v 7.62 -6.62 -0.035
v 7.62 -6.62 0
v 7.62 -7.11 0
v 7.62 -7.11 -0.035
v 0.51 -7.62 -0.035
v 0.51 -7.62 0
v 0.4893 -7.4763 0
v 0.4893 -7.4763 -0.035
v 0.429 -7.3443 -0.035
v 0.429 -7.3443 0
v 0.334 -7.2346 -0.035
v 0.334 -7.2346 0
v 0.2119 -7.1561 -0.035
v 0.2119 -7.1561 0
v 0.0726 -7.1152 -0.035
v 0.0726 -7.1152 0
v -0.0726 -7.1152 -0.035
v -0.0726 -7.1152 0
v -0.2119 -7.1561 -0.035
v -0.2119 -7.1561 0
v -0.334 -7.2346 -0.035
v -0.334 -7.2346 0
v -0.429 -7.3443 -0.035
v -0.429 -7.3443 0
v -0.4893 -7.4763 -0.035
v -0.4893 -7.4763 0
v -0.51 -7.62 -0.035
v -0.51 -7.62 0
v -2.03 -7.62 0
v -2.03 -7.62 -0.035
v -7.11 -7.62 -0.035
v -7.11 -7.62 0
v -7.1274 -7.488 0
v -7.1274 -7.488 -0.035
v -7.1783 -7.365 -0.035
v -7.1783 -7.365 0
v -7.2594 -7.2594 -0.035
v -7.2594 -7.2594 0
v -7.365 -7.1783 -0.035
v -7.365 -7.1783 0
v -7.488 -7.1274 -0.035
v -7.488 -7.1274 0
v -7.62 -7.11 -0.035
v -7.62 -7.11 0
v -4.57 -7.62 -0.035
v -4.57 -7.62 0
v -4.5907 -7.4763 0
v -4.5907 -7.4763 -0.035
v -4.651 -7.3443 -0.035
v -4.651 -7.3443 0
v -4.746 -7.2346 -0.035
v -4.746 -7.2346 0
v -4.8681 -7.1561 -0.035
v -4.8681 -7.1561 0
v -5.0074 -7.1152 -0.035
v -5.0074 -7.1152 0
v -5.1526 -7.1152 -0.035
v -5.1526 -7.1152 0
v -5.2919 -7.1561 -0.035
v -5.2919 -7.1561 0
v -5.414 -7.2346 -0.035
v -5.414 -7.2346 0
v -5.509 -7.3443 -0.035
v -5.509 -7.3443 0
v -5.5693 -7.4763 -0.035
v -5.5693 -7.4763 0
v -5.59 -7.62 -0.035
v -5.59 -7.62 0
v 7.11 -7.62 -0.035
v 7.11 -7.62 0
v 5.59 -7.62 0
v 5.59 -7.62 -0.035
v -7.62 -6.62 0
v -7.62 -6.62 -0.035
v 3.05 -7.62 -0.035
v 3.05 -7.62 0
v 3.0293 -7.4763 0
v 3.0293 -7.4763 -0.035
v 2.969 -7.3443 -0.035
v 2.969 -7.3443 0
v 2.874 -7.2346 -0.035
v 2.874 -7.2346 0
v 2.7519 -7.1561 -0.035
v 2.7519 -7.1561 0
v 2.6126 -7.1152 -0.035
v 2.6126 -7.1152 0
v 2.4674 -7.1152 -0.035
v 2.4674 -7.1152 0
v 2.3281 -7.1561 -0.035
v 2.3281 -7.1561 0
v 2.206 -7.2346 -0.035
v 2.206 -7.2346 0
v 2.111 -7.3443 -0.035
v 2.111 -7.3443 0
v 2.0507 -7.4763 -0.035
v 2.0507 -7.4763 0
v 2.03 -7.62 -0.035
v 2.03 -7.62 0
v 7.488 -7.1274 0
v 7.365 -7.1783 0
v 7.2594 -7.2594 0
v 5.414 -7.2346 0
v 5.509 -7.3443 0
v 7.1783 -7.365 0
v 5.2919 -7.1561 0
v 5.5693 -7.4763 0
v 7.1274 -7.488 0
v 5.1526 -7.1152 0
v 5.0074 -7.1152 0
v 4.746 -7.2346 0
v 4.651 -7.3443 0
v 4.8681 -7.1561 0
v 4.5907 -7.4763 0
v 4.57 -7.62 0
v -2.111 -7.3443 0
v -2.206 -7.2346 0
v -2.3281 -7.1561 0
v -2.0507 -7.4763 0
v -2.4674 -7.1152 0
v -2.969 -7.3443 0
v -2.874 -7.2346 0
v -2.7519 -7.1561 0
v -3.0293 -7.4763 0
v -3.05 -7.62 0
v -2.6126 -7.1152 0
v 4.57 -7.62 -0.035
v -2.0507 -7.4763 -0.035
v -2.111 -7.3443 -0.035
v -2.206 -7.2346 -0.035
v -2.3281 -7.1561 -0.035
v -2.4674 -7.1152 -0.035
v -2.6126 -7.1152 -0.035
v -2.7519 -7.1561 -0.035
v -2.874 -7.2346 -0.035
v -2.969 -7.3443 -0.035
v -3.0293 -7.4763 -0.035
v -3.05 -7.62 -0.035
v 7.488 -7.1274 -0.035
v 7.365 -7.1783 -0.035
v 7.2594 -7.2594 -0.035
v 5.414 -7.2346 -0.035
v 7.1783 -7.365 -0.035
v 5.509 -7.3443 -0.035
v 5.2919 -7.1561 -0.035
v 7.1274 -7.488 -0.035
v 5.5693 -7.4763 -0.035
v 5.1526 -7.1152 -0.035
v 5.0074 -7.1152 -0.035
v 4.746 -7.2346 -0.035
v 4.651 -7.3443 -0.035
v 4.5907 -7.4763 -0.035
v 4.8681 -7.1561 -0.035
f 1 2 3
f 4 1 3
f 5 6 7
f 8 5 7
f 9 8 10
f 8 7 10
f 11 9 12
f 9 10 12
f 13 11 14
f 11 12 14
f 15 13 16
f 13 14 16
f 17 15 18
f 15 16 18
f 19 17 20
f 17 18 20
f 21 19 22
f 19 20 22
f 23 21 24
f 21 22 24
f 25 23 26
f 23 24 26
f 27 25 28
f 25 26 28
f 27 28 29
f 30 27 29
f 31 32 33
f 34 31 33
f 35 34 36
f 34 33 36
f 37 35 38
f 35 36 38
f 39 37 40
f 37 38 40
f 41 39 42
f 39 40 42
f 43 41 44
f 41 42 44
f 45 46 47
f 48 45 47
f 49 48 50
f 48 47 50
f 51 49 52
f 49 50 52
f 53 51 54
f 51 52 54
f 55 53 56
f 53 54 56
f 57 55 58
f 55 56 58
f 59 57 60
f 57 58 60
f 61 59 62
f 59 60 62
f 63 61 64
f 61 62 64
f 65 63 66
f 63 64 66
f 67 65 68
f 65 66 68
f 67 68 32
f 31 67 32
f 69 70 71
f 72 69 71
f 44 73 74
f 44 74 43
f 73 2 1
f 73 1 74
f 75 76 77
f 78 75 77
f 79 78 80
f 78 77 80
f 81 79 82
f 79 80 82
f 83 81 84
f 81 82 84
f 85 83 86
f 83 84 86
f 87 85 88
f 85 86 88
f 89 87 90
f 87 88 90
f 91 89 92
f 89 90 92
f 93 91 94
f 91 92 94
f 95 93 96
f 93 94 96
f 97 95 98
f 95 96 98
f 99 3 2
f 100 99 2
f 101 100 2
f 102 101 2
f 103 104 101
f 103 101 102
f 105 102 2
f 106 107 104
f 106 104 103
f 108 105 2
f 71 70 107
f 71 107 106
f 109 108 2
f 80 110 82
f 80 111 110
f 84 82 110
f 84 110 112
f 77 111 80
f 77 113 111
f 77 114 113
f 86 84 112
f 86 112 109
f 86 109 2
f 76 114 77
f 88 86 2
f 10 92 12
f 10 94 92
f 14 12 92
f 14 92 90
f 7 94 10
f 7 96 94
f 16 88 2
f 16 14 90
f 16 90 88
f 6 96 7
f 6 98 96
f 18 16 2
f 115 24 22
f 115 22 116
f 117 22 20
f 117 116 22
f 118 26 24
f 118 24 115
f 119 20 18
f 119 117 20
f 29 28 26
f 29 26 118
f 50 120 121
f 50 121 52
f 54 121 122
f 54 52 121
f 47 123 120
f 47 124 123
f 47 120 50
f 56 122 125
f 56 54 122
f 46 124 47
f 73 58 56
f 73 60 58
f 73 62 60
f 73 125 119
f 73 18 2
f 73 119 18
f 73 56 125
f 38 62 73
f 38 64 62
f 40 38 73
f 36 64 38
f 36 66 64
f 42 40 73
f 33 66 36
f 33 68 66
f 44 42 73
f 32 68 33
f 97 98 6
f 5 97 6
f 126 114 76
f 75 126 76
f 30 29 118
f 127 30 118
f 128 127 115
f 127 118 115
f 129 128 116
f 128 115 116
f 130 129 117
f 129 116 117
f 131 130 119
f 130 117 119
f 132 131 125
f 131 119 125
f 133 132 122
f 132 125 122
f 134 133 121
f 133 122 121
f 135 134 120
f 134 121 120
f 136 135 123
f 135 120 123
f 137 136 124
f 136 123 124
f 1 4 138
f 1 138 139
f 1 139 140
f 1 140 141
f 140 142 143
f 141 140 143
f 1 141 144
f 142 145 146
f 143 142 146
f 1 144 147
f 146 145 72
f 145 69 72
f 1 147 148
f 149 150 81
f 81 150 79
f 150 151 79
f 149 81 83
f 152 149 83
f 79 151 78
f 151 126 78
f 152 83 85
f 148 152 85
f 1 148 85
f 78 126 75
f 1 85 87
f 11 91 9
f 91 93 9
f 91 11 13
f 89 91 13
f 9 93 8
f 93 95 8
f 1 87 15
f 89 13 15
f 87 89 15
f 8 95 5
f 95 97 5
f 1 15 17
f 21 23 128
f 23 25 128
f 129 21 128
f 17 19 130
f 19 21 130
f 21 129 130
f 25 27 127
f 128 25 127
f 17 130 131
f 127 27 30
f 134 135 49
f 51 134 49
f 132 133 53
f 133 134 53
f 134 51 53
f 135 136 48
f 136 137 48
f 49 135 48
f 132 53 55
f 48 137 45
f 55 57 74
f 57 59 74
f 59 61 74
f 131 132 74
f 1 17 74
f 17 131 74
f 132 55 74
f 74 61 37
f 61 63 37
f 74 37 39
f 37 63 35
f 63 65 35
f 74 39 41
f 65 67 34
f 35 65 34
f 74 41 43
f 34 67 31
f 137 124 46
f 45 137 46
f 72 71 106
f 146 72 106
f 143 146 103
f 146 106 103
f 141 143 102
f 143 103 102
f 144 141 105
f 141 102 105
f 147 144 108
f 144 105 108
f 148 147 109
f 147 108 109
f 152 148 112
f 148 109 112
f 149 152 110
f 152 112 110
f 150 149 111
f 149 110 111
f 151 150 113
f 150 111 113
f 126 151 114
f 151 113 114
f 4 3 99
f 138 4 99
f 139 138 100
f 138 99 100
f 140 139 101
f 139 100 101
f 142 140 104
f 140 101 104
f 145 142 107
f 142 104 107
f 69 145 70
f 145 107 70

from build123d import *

# Parameters (mm, degrees)
SKETCH004_W             = 15.24
SKETCH004_H             = 1
PAD002_DEPTH            = 0.035
SKETCH005_R             = 0.51
POCKET002_DEPTH         = 0.036
LINEARPATTERN005_COUNT  = 7
LINEARPATTERN005_PITCH  = 2.54
BODY004_PLACEMENT_ANGLE = 180


with BuildPart() as part:
    # Sketch004 → Pad002 (new body)
    with BuildSketch(Plane.XY):
        with Locations((0, 7.12)):
            Rectangle(SKETCH004_W, SKETCH004_H)
    extrude(amount=-PAD002_DEPTH)

    # Sketch005 → Pocket002 (cut, through all)
    with BuildSketch(Plane.XY):
        with Locations((-7.62, 7.62)):
            Circle(SKETCH005_R)
    pocket002 = extrude(amount=-POCKET002_DEPTH, mode=Mode.SUBTRACT)

    # LinearPattern005: Pocket002 ×7
    with Locations(*[(i * LINEARPATTERN005_PITCH, 0, 0) for i in range(1, LINEARPATTERN005_COUNT)]):
        add(pocket002, mode=Mode.SUBTRACT)


with BuildPart() as part_1:
    # Body004 placement: moved
    add(part.part.rotate(Axis((0, 0, 0), (0, 0, 1)), BODY004_PLACEMENT_ANGLE))


solid = part_1.part
